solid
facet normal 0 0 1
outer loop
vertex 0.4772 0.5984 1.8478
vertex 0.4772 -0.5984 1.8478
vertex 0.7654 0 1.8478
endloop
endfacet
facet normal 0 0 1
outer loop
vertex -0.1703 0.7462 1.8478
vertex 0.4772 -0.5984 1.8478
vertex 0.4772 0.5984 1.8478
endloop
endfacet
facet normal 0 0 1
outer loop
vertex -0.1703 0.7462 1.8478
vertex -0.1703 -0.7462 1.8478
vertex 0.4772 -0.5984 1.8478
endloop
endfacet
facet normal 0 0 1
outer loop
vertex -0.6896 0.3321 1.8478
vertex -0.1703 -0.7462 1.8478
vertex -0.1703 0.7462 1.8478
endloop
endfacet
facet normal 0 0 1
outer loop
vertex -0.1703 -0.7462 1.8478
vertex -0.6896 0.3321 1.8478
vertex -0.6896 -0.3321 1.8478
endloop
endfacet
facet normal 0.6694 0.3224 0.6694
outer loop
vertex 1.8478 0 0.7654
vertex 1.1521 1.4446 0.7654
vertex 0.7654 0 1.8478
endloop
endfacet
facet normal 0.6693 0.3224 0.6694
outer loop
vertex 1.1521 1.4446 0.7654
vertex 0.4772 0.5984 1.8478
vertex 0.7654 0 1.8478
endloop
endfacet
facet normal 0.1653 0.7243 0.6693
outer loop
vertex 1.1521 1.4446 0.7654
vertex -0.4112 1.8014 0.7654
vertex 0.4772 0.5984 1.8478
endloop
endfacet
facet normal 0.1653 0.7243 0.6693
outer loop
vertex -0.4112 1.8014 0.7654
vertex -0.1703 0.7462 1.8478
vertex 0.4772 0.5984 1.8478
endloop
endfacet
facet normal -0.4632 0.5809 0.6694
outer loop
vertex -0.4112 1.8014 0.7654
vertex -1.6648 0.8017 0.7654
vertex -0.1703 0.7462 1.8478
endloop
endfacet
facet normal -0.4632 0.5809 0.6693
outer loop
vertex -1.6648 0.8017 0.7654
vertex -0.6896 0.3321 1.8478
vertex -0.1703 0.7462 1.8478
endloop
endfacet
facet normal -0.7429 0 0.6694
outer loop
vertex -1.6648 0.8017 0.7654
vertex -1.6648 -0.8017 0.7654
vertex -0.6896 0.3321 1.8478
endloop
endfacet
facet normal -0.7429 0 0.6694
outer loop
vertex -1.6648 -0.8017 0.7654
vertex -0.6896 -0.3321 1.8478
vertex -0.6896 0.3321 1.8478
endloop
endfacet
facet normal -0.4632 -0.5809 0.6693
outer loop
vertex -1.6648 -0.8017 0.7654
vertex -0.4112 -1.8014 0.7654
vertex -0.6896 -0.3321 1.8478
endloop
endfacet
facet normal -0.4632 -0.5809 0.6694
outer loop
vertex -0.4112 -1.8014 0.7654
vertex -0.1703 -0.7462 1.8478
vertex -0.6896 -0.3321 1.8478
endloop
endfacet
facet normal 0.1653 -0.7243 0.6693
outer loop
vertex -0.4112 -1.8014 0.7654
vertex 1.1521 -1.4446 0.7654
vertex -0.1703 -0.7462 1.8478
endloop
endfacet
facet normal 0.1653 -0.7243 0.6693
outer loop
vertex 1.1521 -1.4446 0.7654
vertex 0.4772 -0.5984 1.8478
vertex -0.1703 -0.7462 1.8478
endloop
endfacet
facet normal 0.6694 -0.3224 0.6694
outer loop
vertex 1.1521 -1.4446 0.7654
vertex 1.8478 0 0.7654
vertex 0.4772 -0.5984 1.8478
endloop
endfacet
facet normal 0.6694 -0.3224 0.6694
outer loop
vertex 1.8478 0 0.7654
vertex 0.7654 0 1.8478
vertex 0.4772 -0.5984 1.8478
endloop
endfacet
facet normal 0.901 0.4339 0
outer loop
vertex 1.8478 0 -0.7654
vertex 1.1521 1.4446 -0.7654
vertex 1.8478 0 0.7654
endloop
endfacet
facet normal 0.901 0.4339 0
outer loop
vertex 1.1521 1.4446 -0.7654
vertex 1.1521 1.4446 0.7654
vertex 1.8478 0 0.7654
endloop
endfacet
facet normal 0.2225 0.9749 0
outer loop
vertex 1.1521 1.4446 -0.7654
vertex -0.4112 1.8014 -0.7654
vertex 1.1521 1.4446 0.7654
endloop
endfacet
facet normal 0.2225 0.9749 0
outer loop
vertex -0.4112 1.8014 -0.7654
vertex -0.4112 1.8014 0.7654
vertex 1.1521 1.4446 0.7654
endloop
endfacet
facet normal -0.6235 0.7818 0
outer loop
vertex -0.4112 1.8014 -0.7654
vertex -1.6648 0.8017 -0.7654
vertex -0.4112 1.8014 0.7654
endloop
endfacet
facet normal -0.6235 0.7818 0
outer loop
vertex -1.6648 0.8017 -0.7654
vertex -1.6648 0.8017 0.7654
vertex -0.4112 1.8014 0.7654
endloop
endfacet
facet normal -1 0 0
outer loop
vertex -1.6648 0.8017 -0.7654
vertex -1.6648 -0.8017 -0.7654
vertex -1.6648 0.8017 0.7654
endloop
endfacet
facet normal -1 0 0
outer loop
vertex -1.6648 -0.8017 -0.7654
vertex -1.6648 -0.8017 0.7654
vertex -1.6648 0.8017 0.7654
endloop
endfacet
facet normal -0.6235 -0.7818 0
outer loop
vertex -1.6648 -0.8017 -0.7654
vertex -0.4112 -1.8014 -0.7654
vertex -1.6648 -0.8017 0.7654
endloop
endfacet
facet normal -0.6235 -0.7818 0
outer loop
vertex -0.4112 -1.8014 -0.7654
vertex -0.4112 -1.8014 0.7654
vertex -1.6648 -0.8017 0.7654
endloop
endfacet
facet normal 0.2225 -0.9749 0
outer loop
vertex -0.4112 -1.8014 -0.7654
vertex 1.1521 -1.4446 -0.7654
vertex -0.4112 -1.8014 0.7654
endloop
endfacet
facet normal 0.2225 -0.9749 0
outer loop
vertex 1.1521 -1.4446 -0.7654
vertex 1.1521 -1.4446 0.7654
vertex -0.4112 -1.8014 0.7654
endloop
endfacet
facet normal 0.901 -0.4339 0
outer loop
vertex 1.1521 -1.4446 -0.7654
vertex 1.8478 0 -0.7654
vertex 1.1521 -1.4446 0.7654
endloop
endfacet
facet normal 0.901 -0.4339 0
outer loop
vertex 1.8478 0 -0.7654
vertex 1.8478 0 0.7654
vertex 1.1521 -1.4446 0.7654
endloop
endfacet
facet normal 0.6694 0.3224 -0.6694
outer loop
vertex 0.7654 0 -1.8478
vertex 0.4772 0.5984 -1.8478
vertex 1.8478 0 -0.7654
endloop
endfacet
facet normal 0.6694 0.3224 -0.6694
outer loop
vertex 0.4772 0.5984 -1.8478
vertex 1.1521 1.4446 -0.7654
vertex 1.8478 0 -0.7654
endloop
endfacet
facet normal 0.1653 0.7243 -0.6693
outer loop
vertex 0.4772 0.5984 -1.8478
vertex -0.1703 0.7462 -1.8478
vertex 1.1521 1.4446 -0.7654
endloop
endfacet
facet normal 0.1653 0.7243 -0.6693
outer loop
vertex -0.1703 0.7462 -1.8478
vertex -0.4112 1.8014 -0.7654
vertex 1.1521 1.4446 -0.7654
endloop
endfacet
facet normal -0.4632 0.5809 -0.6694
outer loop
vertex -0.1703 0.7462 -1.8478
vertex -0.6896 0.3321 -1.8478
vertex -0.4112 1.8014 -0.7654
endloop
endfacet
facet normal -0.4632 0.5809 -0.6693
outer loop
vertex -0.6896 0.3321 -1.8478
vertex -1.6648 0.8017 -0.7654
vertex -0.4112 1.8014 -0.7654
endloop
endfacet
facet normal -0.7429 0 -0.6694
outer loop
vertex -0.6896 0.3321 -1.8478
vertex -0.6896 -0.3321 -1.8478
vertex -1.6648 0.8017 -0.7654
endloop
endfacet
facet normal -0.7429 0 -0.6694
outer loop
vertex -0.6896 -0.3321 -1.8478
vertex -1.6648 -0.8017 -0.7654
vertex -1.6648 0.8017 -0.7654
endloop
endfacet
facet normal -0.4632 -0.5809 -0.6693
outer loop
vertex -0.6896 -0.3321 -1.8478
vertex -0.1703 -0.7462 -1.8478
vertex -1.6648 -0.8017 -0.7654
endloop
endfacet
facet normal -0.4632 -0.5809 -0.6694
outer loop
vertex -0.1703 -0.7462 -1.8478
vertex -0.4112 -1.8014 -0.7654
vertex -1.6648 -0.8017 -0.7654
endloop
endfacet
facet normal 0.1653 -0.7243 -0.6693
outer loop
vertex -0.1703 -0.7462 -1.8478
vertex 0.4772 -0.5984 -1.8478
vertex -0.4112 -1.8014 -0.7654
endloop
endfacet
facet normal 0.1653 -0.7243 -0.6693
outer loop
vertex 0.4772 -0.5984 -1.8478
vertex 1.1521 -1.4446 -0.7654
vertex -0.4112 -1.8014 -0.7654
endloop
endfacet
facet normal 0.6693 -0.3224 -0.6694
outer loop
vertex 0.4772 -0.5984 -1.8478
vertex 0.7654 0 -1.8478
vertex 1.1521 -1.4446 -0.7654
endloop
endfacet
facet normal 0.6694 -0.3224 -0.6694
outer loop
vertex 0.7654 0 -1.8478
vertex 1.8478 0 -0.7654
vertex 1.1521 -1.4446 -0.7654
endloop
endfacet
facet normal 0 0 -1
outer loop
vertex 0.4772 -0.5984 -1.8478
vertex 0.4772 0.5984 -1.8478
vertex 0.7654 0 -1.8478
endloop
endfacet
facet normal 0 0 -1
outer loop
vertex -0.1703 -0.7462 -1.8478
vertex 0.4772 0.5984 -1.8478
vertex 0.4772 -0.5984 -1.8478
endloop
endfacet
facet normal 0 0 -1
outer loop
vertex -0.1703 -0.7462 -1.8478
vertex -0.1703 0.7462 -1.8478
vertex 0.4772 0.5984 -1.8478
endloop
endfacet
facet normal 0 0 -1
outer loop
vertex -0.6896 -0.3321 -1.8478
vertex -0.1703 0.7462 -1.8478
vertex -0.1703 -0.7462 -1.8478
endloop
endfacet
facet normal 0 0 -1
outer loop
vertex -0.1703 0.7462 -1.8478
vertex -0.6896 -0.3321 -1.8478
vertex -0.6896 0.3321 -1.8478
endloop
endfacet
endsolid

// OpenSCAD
/*
<json>
    {
        "Name": "Item 1",
        "Desc": "Use the slider to indicate how many columns printed acceptably.",
        "LowKeyword": "Lost",
        "HighKeyword": "Printed",
        "varBase": "PosPillarDiaV",
        "minDefault": 0.1,
        "maxDefault": 2,
        "minDefaultND": "0.5 * nozzleDiameter",
        "maxDefaultND": "5 * nozzleDiameter",
        "cameraData": "-2.28,2.59,6.06,59.9,0,13.8,113.4",
        "sortOrder": 0,
		"instanceCount": 10
    }
</json>
*/

sphere(d=4);

/*
<json>
    {
        "Name": "Item 2",
        "Desc": "Use the slider to indicate how many columns printed acceptably.",
        "LowKeyword": "Lost",
        "HighKeyword": "Printed",
        "varBase": "PosPillarDiaG",
        "minDefault": 0.1,
        "maxDefault": 2,
        "minDefaultND": "0.5 * nozzleDiameter",
        "maxDefaultND": "5 * nozzleDiameter",
        "cameraData": "-2.28,2.59,6.06,59.9,0,13.8,113.4",
        "sortOrder": 0,
		"instanceCount": 10
    }
</json>
*/
